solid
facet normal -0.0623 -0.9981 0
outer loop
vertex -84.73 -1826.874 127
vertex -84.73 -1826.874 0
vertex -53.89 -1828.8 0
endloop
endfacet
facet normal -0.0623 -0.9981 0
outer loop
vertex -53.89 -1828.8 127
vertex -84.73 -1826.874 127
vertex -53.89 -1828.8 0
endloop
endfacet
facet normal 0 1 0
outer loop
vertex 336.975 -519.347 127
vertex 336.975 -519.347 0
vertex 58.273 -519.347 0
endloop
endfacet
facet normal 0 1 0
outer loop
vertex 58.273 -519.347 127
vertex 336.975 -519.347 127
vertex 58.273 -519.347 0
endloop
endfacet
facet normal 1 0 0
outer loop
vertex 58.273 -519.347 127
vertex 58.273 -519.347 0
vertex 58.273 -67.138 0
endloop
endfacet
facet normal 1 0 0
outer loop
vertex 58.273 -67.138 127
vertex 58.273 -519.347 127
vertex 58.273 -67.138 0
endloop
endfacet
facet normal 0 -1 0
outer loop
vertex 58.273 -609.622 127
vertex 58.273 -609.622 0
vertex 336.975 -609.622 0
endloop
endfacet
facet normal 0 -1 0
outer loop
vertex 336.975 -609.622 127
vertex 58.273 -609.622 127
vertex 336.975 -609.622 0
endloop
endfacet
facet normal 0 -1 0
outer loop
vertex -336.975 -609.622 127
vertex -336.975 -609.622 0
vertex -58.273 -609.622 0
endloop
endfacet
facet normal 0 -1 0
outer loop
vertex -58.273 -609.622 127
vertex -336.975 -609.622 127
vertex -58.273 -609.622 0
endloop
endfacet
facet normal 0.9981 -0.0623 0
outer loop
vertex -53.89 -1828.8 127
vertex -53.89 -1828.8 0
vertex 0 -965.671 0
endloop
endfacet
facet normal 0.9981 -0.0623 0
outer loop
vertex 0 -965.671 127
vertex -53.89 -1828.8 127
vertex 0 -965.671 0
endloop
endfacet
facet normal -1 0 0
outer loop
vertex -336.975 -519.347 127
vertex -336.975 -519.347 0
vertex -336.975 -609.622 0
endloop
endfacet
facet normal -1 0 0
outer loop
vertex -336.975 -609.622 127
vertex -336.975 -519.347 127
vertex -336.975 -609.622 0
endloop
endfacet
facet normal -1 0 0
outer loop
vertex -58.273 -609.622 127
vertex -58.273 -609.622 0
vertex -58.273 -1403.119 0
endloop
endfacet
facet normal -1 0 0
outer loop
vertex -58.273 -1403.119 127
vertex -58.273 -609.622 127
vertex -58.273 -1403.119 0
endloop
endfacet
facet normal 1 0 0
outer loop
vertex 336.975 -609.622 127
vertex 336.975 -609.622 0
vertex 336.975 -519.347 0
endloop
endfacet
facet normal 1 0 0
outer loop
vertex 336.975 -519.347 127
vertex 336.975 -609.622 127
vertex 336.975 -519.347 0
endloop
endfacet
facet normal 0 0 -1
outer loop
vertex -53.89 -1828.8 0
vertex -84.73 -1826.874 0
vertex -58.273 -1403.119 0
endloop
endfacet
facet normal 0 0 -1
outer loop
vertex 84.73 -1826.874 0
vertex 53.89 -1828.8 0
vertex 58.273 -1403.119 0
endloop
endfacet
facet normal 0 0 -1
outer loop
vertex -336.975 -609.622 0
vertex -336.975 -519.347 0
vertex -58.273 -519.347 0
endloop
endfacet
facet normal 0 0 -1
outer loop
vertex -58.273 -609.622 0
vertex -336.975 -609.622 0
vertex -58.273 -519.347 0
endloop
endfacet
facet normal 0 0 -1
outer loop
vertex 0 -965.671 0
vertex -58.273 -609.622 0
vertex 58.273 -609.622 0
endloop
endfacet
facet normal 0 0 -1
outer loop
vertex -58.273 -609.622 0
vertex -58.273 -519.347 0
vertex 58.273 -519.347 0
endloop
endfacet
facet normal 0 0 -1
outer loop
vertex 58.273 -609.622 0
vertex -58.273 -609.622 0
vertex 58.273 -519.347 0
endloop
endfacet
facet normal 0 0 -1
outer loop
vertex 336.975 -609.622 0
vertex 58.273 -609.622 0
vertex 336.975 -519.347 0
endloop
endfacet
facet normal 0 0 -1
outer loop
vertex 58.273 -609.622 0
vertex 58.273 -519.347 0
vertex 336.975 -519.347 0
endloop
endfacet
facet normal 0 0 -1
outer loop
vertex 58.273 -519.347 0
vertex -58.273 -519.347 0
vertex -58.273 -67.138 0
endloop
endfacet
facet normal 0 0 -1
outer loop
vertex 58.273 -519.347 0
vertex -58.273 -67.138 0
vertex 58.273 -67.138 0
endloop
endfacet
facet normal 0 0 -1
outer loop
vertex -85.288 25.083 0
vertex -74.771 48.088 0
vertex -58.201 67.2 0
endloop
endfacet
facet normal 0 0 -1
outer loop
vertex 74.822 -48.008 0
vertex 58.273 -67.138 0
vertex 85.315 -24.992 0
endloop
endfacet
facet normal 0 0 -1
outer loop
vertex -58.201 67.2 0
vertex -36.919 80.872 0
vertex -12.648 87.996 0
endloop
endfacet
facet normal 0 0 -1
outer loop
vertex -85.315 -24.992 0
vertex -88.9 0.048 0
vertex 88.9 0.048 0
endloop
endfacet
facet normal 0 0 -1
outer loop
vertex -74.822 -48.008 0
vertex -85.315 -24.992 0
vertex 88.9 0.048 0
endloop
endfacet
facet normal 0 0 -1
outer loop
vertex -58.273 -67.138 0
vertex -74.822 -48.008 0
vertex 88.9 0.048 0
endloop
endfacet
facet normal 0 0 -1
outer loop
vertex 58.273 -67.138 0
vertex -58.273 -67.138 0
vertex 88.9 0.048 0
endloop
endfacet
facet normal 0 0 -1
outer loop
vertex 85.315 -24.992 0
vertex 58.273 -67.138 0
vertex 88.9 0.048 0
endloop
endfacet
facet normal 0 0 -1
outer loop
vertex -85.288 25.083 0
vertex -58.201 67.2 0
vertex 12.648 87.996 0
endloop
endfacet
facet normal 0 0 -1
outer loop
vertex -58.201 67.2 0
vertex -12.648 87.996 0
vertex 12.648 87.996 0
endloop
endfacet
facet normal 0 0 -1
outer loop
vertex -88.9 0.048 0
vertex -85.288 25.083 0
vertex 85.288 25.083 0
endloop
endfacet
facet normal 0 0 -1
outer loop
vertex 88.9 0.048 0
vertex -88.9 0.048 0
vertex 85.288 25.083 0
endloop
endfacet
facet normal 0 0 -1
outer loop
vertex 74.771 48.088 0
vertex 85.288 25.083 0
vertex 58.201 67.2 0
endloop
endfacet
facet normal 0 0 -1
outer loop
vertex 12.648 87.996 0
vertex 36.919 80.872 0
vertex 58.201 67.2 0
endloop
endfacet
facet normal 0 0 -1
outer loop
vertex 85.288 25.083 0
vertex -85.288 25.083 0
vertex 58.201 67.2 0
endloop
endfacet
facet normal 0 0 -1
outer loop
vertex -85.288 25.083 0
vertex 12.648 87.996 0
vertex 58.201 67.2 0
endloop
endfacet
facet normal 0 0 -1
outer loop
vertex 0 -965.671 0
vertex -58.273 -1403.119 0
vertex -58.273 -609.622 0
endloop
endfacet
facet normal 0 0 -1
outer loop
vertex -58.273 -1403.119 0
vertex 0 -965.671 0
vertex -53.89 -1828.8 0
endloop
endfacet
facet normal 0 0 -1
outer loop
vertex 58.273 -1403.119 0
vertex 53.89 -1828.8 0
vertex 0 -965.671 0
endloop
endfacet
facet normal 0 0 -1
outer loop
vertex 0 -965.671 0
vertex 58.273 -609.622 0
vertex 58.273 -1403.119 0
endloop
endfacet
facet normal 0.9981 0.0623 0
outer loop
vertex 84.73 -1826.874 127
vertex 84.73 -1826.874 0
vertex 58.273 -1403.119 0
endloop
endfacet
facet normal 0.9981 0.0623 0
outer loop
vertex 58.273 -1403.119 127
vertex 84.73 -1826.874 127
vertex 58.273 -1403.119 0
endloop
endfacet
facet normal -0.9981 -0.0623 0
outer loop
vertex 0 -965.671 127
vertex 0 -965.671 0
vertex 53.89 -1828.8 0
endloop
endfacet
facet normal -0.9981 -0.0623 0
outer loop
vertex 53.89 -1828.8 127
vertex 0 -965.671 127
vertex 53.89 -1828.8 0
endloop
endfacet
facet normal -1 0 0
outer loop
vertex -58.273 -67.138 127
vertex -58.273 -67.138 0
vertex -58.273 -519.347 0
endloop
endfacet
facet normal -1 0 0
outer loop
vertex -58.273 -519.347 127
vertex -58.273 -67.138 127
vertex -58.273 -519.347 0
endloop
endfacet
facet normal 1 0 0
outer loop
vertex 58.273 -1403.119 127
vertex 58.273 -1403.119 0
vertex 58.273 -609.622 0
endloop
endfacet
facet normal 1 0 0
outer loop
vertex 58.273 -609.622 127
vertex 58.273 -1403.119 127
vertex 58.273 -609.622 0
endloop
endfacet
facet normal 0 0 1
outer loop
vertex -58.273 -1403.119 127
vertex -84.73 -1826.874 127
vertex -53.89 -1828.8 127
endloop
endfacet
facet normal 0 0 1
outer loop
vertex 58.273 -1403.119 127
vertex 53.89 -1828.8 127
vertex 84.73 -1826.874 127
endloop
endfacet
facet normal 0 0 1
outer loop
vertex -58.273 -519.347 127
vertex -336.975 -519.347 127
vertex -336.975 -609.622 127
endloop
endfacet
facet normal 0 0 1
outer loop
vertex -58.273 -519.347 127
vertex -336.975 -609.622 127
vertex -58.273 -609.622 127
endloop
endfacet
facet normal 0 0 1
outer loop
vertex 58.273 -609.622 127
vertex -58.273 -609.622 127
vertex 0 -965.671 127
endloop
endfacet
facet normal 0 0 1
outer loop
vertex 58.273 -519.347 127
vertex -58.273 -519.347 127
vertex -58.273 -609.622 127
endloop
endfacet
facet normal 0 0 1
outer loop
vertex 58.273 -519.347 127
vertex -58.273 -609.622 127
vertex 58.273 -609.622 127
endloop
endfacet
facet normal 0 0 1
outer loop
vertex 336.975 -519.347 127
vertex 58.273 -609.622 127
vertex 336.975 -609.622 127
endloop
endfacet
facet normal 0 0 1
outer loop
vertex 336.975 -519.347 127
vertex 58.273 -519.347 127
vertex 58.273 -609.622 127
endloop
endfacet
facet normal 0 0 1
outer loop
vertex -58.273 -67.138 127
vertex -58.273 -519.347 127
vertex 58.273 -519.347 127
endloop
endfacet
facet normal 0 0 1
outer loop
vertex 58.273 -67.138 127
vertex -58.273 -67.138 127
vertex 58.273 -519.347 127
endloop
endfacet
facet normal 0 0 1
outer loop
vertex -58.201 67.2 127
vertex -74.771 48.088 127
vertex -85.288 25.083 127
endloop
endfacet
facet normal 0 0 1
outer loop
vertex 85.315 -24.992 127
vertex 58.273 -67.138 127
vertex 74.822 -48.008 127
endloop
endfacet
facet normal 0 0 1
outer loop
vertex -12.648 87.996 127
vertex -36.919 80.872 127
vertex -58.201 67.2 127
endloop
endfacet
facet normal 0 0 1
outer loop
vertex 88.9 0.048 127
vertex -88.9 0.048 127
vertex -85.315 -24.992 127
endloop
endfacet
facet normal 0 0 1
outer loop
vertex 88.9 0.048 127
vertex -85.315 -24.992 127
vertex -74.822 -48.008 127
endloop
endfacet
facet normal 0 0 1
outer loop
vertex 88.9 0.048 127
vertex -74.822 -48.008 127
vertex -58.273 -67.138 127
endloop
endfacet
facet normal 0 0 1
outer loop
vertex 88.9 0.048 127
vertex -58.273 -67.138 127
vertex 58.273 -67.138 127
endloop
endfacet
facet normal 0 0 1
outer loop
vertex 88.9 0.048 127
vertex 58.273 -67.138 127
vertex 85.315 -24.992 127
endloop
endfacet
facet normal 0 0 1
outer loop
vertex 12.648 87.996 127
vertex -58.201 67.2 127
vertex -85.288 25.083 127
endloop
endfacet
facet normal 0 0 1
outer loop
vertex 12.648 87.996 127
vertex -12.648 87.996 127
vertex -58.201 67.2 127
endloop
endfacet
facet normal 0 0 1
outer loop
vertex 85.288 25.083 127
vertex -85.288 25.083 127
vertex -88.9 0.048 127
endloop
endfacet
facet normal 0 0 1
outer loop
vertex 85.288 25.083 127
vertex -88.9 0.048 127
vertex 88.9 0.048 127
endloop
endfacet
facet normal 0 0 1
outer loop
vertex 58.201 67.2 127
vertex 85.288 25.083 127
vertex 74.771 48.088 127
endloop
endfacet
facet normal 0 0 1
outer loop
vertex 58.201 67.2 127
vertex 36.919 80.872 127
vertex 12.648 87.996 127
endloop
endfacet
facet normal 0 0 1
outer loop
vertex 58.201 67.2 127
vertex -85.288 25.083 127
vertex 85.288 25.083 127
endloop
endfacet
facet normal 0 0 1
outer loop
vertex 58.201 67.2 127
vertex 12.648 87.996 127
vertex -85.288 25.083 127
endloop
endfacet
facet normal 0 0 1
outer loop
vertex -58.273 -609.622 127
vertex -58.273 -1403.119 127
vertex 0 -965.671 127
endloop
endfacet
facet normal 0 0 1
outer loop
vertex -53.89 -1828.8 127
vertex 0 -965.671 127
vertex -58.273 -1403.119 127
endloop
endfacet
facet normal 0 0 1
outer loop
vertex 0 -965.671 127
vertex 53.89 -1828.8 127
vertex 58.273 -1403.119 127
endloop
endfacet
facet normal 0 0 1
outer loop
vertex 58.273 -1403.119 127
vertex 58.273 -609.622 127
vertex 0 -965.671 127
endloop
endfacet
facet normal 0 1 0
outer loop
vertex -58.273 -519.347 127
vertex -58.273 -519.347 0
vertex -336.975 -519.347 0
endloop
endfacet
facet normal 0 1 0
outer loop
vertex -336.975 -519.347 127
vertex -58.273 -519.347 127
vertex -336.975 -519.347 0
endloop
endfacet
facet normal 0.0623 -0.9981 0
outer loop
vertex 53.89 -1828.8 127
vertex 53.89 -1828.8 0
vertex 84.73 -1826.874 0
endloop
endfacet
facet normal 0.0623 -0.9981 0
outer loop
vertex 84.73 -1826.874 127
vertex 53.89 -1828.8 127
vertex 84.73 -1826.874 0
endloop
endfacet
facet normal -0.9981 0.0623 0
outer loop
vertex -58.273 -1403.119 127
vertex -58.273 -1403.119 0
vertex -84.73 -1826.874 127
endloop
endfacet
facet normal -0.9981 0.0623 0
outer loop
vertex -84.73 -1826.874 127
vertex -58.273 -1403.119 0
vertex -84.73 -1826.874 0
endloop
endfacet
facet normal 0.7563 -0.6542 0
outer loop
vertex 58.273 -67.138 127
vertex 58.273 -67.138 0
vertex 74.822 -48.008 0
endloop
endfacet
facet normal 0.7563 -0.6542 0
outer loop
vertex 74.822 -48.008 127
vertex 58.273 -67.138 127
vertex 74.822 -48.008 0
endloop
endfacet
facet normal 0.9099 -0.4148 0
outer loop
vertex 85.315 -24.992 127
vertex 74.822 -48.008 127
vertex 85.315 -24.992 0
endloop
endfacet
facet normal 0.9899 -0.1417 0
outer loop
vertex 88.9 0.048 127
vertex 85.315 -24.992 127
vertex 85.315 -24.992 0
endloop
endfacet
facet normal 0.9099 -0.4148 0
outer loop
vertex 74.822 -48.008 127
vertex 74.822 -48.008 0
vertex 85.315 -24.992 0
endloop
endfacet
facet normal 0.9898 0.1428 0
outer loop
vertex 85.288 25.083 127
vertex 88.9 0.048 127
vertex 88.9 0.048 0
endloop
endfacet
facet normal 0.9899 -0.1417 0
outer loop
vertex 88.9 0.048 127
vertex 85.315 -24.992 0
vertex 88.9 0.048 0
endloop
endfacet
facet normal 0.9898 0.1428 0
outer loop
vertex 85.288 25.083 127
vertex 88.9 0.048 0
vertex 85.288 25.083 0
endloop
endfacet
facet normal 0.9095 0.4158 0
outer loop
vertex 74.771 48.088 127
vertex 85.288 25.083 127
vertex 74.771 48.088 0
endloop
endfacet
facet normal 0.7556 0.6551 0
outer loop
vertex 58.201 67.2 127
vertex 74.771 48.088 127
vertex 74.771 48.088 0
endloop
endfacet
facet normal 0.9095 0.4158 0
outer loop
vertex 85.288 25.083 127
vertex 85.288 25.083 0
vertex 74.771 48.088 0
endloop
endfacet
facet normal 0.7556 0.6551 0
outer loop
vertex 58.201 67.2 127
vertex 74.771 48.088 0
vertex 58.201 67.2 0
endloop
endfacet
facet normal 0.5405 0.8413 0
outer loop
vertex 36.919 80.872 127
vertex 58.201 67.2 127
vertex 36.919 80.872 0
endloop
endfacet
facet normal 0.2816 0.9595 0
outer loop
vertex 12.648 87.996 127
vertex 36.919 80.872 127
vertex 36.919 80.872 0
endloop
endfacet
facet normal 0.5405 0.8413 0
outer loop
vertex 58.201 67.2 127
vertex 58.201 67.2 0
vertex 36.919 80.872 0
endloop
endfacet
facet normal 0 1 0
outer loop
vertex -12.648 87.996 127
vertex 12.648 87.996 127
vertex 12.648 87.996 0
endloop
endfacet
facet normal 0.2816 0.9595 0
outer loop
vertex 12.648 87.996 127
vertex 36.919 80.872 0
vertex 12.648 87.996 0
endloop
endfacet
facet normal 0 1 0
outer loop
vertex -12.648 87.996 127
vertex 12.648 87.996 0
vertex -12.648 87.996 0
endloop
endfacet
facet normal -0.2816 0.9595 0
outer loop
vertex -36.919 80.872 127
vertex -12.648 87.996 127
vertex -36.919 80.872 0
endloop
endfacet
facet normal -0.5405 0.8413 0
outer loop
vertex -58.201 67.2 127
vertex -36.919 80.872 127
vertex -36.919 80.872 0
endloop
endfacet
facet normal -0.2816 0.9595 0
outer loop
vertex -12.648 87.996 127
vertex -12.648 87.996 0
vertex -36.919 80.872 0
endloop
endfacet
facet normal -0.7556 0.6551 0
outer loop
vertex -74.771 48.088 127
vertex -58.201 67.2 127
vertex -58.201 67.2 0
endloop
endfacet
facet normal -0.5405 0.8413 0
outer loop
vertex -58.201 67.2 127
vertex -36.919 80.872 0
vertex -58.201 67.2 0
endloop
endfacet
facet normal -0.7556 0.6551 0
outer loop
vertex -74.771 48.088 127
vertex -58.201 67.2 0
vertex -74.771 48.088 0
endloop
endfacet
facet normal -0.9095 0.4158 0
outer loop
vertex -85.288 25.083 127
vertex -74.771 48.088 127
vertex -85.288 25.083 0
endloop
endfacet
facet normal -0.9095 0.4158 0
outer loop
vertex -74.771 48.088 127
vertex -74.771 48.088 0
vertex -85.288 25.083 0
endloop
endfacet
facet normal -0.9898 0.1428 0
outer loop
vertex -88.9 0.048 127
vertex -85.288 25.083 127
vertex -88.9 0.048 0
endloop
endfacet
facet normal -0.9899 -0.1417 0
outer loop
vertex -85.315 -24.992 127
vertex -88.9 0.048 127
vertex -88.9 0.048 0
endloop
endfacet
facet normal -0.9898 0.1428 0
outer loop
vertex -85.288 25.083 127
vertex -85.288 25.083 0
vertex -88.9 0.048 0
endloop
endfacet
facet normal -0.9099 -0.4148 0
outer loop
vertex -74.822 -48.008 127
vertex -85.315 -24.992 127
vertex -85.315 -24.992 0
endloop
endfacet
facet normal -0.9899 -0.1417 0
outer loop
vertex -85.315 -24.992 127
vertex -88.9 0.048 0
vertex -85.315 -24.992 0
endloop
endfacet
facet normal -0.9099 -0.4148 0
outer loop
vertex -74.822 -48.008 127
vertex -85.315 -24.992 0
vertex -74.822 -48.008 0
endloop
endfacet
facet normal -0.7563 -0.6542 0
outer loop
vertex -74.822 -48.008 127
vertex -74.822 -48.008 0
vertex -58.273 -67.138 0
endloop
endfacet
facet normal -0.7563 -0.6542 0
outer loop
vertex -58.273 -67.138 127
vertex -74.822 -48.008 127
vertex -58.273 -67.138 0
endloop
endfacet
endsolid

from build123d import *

# Parameters (mm, degrees)
BOSS_EXTRUDE2_DEPTH = 127


with BuildPart() as part:
    # Sketch1 → Boss-Extrude2 (new body)
    with BuildSketch(Plane.XY):
        with BuildLine():
            Line((-58.272673139, -67.137959198), (-58.272673139, -519.346809046))
            Line((-58.272673139, -519.346809046), (-336.974932069, -519.346809046))
            Line((-336.974932069, -519.346809046), (-336.974932069, -609.62196559))
            Line((-336.974932069, -609.62196559), (-58.272673139, -609.62196559))
            Line((-58.272673139, -609.62196559), (-58.272673139, -1403.11866405))
            Line((-58.272673139, -1403.11866405), (-84.73010294, -1826.874477175))
            Line((-84.73010294, -1826.874477175), (-53.889938316, -1828.8))
            Line((-53.889938316, -1828.8), (0, -965.671011219))
            Line((0, -965.671011219), (53.889938316, -1828.8))
            Line((53.889938316, -1828.8), (84.73010294, -1826.874477175))
            Line((84.73010294, -1826.874477175), (58.272673139, -1403.11866405))
            Line((58.272673139, -1403.11866405), (58.272673139, -609.62196559))
            Line((58.272673139, -609.62196559), (336.974932069, -609.62196559))
            Line((336.974932069, -609.62196559), (336.974932069, -519.346809046))
            Line((336.974932069, -519.346809046), (58.272673139, -519.346809046))
            Line((58.272673139, -519.346809046), (58.272673139, -67.137959198))
            ThreePointArc((58.272673139, -67.137959198), (0, 88.9), (-58.272673139, -67.137959198))
        make_face()
    extrude(amount=BOSS_EXTRUDE2_DEPTH)


solid = part.part
